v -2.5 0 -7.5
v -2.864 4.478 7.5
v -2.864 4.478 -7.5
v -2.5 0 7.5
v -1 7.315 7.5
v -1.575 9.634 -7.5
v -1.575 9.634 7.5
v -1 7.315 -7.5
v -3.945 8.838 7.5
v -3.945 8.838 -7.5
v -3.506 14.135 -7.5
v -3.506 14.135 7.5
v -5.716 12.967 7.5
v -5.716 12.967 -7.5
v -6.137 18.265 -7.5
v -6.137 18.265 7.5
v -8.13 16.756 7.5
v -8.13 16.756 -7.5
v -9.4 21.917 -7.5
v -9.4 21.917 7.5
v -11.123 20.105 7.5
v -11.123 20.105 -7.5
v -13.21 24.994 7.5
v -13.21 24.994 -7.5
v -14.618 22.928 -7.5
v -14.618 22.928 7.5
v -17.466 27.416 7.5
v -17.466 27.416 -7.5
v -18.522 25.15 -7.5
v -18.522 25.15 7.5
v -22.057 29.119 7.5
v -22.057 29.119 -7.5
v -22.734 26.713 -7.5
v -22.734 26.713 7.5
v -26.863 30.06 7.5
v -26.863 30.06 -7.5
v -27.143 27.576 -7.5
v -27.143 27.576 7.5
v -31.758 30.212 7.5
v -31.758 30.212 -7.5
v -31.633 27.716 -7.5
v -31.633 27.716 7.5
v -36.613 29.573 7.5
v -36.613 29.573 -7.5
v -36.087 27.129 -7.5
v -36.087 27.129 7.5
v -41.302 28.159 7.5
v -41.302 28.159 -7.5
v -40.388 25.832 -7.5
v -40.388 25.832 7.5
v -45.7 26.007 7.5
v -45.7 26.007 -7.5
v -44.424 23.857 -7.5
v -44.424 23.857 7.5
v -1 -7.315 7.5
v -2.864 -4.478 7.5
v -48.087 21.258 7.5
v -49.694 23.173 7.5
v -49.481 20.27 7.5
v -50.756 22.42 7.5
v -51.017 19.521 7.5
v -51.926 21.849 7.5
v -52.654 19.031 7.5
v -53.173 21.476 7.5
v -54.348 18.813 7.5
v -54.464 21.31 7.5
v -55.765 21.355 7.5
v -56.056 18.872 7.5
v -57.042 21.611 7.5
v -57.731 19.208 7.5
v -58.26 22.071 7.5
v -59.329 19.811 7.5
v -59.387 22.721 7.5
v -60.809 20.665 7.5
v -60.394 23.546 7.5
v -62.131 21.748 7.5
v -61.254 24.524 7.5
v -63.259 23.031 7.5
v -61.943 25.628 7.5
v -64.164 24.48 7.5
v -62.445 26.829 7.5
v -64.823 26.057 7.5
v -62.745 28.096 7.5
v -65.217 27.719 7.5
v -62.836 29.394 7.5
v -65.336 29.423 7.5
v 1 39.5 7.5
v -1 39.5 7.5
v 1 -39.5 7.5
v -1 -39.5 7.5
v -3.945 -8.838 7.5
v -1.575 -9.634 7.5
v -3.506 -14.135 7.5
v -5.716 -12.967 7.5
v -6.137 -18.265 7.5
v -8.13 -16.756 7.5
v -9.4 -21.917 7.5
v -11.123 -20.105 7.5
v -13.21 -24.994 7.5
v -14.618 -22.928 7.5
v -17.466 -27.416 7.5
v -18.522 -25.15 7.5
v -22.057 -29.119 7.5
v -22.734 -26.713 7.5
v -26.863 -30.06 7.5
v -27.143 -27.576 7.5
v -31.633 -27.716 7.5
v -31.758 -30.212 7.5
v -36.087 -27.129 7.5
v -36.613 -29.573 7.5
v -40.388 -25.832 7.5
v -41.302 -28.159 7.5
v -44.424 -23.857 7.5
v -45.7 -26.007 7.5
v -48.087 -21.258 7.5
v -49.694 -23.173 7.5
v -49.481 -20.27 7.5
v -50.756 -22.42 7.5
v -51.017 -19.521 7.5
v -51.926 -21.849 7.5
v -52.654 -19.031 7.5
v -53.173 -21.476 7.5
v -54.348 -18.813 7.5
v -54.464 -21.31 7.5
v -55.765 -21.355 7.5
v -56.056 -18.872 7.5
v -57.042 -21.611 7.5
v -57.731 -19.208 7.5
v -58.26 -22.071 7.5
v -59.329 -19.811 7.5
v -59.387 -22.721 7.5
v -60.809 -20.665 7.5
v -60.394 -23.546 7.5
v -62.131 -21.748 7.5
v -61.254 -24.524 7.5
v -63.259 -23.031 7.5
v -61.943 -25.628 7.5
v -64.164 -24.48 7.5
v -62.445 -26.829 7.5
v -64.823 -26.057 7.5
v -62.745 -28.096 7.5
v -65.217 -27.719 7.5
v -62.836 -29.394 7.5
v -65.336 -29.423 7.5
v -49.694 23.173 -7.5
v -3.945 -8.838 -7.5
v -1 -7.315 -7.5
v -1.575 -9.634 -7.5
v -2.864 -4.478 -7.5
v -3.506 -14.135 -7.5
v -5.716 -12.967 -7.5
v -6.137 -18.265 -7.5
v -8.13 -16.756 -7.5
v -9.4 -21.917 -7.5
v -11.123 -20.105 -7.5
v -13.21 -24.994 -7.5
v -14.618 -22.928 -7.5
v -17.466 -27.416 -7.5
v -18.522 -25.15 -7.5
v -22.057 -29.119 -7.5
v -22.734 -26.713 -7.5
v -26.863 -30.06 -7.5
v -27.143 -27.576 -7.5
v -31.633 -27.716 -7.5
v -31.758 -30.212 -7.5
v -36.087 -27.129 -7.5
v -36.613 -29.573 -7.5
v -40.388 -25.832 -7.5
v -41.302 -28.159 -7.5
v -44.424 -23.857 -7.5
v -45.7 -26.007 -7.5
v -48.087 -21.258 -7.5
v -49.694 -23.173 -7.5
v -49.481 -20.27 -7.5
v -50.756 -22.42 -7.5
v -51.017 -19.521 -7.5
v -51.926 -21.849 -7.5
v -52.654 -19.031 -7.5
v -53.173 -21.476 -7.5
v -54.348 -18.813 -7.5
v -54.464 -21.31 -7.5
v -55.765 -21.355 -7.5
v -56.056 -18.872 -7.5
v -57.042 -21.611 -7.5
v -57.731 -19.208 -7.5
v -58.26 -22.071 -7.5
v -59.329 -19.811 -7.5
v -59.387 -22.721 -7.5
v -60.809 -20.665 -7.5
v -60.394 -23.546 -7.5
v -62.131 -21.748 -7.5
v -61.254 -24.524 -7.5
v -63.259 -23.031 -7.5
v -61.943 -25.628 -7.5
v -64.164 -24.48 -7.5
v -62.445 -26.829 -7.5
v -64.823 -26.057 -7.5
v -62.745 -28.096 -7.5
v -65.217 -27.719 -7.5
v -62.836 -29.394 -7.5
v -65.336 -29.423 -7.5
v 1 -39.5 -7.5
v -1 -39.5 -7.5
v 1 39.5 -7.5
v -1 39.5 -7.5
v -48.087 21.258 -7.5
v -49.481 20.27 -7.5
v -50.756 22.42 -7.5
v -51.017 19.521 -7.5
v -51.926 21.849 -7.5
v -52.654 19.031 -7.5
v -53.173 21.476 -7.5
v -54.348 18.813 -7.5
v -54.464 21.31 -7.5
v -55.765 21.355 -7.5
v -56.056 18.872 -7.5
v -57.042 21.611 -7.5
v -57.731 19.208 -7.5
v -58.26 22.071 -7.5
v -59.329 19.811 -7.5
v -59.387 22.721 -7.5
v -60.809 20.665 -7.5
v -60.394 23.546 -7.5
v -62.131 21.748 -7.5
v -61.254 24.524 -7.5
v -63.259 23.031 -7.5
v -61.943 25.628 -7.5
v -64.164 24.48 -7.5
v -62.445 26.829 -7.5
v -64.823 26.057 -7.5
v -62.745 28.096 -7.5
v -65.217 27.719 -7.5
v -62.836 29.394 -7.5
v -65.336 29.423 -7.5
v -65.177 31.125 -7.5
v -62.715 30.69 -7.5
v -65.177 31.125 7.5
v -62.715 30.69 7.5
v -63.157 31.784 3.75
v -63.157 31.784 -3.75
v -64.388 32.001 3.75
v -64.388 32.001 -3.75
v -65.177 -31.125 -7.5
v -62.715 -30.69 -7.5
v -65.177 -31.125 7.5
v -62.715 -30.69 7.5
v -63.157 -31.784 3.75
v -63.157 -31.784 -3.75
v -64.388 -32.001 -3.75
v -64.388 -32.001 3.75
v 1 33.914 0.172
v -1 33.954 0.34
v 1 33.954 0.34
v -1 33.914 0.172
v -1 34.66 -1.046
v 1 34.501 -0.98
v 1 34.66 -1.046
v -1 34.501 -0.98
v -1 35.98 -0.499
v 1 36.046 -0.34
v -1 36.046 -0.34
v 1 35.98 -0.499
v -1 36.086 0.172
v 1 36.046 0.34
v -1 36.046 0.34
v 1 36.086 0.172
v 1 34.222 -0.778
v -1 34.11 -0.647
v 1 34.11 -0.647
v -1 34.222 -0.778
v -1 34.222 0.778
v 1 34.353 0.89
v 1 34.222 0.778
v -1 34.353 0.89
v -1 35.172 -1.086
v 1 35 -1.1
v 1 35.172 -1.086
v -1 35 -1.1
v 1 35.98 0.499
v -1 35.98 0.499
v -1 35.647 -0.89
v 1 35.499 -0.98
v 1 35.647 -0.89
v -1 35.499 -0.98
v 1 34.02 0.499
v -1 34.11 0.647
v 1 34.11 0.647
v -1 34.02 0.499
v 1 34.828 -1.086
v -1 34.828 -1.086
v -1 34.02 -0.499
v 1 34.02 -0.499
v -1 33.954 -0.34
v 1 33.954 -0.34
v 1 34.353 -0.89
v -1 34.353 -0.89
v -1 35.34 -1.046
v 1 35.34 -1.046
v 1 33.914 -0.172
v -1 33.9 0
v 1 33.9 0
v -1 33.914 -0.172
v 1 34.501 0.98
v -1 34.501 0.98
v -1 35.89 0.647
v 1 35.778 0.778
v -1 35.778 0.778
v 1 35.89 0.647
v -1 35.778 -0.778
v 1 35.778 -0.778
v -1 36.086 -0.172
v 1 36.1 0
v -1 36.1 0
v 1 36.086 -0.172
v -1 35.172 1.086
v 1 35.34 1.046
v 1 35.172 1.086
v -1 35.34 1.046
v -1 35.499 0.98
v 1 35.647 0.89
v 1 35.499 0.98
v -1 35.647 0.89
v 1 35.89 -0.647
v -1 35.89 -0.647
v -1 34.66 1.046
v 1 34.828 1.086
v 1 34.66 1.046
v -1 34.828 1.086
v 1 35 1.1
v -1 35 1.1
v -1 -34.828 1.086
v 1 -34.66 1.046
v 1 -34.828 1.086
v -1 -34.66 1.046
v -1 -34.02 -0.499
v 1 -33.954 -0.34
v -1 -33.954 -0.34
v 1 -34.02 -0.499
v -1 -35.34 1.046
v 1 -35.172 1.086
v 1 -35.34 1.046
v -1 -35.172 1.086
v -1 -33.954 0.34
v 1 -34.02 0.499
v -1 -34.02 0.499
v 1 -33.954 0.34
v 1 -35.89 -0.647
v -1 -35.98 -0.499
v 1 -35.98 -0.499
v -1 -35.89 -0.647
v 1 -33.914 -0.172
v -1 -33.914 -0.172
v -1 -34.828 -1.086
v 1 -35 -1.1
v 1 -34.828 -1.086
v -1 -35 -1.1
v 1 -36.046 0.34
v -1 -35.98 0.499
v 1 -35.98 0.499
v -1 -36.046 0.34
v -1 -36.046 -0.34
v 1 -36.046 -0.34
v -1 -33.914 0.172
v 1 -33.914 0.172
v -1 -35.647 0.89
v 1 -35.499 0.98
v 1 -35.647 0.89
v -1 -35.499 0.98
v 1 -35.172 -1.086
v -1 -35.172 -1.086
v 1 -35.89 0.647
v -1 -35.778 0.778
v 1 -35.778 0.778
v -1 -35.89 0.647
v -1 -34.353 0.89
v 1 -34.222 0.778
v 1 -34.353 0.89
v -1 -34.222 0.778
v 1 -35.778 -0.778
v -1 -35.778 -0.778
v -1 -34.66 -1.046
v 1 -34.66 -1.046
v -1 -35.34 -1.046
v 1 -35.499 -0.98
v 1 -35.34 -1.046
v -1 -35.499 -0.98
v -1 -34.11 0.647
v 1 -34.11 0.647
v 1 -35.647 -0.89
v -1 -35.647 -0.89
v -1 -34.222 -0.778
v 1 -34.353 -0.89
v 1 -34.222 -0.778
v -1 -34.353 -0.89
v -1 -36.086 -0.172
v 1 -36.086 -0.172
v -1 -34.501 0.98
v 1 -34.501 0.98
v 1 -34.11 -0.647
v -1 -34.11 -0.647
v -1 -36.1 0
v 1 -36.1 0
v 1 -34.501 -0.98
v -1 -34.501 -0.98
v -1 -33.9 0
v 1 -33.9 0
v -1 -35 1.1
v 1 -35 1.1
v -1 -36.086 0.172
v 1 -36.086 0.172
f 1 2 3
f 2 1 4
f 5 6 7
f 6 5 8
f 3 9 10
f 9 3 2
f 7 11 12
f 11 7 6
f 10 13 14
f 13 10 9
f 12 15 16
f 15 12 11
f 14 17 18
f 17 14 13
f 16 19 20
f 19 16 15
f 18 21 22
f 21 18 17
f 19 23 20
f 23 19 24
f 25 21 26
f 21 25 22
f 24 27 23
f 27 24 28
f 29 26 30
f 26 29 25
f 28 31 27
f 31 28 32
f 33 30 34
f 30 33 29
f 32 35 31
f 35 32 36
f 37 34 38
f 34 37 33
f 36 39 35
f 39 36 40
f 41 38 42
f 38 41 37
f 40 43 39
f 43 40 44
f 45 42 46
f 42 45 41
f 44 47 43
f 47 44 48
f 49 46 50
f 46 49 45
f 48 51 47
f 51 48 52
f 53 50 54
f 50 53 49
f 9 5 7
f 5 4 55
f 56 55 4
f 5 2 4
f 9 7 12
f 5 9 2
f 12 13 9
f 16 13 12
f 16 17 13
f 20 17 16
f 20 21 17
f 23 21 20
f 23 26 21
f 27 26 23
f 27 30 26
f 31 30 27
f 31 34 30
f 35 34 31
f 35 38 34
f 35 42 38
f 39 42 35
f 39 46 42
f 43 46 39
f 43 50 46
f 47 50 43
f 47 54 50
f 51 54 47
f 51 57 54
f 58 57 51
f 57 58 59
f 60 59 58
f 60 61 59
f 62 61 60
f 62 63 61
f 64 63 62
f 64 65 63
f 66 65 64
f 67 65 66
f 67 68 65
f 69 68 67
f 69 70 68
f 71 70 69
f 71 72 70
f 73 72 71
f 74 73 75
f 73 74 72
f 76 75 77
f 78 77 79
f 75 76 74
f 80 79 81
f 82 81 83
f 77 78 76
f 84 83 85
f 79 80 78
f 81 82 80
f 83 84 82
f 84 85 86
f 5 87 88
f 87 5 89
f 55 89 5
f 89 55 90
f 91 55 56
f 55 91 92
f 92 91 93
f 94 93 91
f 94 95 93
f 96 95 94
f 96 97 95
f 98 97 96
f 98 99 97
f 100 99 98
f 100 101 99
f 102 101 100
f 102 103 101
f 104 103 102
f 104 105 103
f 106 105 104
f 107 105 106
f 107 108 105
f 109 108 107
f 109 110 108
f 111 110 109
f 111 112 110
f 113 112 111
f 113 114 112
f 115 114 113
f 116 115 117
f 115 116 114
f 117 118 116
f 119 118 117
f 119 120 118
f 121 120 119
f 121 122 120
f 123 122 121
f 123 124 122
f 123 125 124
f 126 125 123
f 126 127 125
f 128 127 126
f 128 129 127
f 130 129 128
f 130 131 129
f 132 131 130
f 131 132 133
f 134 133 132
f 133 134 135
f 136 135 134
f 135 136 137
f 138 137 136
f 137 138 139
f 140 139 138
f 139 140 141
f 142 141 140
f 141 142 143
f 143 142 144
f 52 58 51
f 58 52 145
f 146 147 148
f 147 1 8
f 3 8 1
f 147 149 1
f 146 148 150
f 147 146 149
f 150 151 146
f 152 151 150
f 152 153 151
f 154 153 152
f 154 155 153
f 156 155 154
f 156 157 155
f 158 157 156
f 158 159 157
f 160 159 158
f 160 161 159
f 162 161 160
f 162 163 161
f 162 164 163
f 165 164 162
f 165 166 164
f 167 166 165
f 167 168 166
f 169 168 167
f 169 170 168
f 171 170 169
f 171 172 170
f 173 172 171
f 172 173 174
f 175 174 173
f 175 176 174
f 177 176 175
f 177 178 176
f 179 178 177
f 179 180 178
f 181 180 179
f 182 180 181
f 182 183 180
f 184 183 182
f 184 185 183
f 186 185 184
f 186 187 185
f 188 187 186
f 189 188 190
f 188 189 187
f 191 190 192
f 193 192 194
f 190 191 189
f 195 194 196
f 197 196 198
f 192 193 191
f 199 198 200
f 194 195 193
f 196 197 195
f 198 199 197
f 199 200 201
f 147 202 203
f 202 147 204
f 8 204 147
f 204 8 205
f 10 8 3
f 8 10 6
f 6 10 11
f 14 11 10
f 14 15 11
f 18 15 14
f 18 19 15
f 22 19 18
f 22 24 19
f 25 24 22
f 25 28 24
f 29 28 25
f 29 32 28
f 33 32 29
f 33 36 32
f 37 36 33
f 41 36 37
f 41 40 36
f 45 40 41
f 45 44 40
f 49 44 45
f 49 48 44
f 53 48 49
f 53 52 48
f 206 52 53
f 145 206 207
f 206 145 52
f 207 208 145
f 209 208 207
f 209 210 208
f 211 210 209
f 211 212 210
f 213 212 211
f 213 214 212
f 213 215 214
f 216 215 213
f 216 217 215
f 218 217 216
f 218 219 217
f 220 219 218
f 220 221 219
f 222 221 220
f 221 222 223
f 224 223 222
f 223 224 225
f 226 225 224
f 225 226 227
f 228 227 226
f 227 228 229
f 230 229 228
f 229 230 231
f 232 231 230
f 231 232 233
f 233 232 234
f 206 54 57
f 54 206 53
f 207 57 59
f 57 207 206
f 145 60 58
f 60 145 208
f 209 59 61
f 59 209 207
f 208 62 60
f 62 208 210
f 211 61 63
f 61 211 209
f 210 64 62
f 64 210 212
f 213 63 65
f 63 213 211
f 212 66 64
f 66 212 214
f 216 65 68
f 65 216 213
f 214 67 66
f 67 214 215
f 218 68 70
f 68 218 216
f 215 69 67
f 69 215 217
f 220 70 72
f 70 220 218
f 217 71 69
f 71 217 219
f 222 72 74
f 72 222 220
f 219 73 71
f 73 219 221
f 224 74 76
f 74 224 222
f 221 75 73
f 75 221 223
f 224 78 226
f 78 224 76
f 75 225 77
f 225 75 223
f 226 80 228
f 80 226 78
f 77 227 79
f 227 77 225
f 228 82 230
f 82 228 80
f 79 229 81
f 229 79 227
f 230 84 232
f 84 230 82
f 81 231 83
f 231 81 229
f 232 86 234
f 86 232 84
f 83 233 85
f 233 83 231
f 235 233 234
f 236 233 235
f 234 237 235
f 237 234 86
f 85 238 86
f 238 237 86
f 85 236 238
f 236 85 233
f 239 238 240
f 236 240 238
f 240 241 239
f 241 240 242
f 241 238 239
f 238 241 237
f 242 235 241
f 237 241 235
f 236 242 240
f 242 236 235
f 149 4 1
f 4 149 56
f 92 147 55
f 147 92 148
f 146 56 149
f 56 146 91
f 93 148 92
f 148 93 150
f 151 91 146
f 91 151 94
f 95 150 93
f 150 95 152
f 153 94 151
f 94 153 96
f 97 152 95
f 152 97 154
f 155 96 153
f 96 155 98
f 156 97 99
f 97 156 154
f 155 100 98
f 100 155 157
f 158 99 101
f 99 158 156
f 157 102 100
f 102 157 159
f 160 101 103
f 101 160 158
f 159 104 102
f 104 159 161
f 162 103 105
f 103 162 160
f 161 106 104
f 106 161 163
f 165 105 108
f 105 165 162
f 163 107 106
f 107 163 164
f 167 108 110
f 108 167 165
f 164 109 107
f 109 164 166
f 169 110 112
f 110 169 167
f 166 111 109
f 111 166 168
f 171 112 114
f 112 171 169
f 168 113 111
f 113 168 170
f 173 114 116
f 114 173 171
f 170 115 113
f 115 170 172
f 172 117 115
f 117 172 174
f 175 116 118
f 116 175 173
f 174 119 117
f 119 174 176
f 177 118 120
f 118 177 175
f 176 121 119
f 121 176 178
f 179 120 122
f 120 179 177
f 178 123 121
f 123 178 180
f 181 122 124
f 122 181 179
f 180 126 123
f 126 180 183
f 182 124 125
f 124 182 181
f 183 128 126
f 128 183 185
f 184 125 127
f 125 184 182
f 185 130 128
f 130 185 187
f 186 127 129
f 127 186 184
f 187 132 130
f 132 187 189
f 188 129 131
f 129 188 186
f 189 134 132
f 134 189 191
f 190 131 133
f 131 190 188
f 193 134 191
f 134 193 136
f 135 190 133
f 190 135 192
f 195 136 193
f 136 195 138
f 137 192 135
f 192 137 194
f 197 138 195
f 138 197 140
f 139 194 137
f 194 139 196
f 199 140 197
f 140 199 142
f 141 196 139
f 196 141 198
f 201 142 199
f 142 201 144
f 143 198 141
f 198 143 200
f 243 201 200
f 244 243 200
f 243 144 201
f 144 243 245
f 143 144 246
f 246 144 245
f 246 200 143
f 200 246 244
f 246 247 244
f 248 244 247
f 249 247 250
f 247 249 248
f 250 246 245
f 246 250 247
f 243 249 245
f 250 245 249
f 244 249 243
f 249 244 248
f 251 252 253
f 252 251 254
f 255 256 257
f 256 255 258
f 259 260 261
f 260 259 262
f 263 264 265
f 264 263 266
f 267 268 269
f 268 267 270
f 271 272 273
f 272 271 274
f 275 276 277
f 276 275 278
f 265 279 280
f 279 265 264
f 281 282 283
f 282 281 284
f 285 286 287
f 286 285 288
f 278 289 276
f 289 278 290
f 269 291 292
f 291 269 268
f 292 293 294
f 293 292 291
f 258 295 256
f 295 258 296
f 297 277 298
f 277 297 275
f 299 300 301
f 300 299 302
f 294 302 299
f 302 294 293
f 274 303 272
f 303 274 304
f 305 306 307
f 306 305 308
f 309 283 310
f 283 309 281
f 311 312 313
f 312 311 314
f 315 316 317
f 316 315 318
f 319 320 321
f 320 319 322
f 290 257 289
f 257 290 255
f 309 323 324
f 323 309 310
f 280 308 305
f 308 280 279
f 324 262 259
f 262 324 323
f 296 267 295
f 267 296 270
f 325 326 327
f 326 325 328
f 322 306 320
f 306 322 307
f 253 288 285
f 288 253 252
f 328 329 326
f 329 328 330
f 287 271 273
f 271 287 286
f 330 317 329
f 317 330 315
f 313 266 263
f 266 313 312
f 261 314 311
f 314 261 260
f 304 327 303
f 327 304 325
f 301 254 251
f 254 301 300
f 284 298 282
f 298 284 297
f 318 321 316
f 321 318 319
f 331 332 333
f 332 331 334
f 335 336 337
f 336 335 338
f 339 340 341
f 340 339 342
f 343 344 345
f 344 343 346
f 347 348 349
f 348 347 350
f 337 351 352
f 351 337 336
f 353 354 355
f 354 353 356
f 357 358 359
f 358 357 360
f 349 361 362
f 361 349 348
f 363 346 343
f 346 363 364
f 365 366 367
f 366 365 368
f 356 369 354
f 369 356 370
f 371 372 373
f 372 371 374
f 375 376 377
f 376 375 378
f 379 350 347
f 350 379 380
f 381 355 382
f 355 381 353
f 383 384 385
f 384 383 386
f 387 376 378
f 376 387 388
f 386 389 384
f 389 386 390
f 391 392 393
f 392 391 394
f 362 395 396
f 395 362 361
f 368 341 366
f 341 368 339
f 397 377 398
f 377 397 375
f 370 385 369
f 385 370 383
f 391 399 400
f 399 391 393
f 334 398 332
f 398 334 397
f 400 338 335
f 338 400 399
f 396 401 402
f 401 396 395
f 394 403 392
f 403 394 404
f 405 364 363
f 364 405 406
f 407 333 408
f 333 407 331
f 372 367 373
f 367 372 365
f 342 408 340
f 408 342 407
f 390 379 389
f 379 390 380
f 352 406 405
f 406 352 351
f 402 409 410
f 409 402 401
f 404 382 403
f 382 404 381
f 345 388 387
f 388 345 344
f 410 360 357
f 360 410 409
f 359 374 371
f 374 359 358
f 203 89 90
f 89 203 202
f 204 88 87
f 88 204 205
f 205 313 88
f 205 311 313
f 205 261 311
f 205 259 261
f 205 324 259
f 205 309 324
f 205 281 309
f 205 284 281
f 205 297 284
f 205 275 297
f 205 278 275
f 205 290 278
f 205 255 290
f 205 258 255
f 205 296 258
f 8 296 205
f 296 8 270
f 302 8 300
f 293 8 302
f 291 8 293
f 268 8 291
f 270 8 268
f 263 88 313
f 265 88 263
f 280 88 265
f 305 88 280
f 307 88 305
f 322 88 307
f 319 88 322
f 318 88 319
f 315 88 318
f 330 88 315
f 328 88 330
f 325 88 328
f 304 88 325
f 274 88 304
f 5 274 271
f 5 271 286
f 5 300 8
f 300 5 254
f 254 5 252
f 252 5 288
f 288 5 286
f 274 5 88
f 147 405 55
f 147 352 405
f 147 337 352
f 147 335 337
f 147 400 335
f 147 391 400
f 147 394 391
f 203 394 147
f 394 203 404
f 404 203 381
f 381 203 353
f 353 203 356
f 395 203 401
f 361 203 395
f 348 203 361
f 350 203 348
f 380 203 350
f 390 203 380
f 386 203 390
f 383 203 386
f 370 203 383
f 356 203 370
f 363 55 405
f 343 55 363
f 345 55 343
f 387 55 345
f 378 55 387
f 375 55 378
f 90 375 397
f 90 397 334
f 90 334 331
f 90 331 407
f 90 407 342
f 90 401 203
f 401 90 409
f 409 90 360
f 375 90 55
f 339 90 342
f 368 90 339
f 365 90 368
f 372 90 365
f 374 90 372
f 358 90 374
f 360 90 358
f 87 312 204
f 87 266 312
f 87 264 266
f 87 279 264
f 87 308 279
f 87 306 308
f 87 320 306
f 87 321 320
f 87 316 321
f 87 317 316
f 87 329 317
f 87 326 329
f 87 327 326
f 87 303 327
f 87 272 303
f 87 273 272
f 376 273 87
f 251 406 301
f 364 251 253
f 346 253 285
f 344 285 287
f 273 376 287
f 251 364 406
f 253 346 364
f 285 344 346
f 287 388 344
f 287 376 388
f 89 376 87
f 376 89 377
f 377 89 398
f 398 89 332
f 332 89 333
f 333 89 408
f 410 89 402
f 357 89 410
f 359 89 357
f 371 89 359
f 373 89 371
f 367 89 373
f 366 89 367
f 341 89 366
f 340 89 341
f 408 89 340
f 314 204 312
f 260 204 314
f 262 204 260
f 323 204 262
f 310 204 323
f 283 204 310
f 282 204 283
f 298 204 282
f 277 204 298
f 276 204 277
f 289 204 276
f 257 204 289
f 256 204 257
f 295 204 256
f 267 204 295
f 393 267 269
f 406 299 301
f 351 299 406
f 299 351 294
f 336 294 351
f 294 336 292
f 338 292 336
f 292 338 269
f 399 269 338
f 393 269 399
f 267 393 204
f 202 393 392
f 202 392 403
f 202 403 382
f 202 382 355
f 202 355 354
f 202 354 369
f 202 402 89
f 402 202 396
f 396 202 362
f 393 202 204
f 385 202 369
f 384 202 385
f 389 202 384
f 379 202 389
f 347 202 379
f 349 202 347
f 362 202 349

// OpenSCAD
// Command Strip Parametric Cup Clip
// Brian Khuu 2023 June

$fn = 40;

/* [Holder Spec] */
handle_count = 1;
handle_spacing = 70;

/* [Handle Spec] */
handle_diameter = 55; // small glass cup = 39, larger glass cup = 59
handle_offset = 0;
handle_tol = 0.5;

/* [Mount Screw Spec] */
screw_enable = true;
screw_hole_size = 2;
screw_hole_tol = 0.1;

/* [Mount Base Spec] */
mount_base_thickness = 2;
mount_base_length = handle_spacing*handle_count+screw_hole_size*2+5; // Command strips lengths: 30mm, 60mm
mount_base_height = 15;

/* [Mount Tab Spec] */
mount_tab_enable = false;
mount_tab_length = 20;
mount_tab_thickness = 0.6;

/* [Mount Curve Spec] */
curve_thickness = 2.5;
curve_height = mount_base_height;


module hookCrossSection()
{
    square(size = [curve_thickness, curve_height], center = true);
}

module hookHalfCurve(majorcurve_radius, flange_radius)
{
    majorcurve_angle = 90+30+10;
    flange_angle = 140;
    translate([-majorcurve_radius,0,0])
        union()
        {
            // Major Curve
            rotate_extrude(angle = majorcurve_angle) 
                translate([majorcurve_radius+curve_thickness/2, 0, 0])
                    hookCrossSection();
            // Mini Curve
            rotate([0,0,-180+majorcurve_angle])
            translate([-majorcurve_radius-flange_radius-curve_thickness/2,0,0])
            rotate_extrude(angle = -flange_angle) 
                translate([flange_radius, 0, 0])        
                    hookCrossSection();
            // Mini Curve Cap
            rotate([0,0,-180+majorcurve_angle])
            translate([-majorcurve_radius-flange_radius-curve_thickness/2,0,0])
                rotate([0,0,-flange_angle])
                    translate([flange_radius, 0, 0])
                        rotate([90,0,0])
                            linear_extrude(height=1, scale=0.5)
                                hookCrossSection();
        }  
}


module hookClip()
{
    clip_shift_offset = curve_thickness + handle_offset;
    hook_diameter = handle_diameter + handle_tol;
    majorcurve_radius = hook_diameter/2;
    flange_radius = hook_diameter/6;
    union()
    {
        // Hook
        translate([-clip_shift_offset,0,0])
            union()
            {
                hookHalfCurve(majorcurve_radius, flange_radius);
                mirror([0,1,0])
                    hookHalfCurve(majorcurve_radius, flange_radius);
            }
        // Spacer
        translate([-clip_shift_offset/2,0,0])
            cube([clip_shift_offset,curve_thickness,curve_height], center=true);
    }
    // Sanity check that the handle fits
    if (0)
    translate([-clip_shift_offset-handle_diameter/2,0,0])
        %cylinder(d=handle_diameter, h=mount_base_height+10, center=true);
}

union()
{
    translate([0,-((handle_count-1)*handle_spacing)/2,0])    
        for (i = [0 : 1 : handle_count-1])
        {
            translate([0,i*handle_spacing,0])
                hookClip();
        }
    difference()
    {
        rotate([0,0,-90])
            cube([mount_base_length, mount_base_thickness, curve_height], center=true);

        translate([0,-((handle_count-1)*handle_spacing)/2,0])    
            for (i = [0 : 1 : handle_count-1])
            {
                translate([0,i*handle_spacing+handle_spacing/2,0])
                    rotate([0,90,0])
                        cylinder(r=screw_hole_size/2+screw_hole_tol, h=mount_base_thickness+0.2, center=true);
                translate([0,i*handle_spacing-handle_spacing/2,0])
                    rotate([0,90,0])
                        cylinder(r=screw_hole_size/2+screw_hole_tol, h=mount_base_thickness+0.2, center=true);
            }        translate([0,-((handle_count-1)*handle_spacing)/2,0])    
        %for (i = [0 : 1 : handle_count-1])
            {
                translate([0,i*handle_spacing+handle_spacing/2,0])
                    rotate([0,90,180])
                        cylinder(r=0.1, h=100);
                translate([0,i*handle_spacing-handle_spacing/2,0])
                    rotate([0,90,180])
                        cylinder(r=0.1, h=100);
            }
        
    }
    if (mount_tab_enable)
    {
        translate([-(mount_base_thickness-mount_tab_thickness)/2,mount_base_length/2+mount_tab_length/2,0])
            rotate([0,0,-90])
                cube([mount_tab_length, mount_tab_thickness, curve_height], center=true);
        translate([-(mount_base_thickness-mount_tab_thickness)/2,-(mount_base_length/2+mount_tab_length/2),0])
            rotate([0,0,-90])
                cube([mount_tab_length, mount_tab_thickness, curve_height], center=true);
    }
}
